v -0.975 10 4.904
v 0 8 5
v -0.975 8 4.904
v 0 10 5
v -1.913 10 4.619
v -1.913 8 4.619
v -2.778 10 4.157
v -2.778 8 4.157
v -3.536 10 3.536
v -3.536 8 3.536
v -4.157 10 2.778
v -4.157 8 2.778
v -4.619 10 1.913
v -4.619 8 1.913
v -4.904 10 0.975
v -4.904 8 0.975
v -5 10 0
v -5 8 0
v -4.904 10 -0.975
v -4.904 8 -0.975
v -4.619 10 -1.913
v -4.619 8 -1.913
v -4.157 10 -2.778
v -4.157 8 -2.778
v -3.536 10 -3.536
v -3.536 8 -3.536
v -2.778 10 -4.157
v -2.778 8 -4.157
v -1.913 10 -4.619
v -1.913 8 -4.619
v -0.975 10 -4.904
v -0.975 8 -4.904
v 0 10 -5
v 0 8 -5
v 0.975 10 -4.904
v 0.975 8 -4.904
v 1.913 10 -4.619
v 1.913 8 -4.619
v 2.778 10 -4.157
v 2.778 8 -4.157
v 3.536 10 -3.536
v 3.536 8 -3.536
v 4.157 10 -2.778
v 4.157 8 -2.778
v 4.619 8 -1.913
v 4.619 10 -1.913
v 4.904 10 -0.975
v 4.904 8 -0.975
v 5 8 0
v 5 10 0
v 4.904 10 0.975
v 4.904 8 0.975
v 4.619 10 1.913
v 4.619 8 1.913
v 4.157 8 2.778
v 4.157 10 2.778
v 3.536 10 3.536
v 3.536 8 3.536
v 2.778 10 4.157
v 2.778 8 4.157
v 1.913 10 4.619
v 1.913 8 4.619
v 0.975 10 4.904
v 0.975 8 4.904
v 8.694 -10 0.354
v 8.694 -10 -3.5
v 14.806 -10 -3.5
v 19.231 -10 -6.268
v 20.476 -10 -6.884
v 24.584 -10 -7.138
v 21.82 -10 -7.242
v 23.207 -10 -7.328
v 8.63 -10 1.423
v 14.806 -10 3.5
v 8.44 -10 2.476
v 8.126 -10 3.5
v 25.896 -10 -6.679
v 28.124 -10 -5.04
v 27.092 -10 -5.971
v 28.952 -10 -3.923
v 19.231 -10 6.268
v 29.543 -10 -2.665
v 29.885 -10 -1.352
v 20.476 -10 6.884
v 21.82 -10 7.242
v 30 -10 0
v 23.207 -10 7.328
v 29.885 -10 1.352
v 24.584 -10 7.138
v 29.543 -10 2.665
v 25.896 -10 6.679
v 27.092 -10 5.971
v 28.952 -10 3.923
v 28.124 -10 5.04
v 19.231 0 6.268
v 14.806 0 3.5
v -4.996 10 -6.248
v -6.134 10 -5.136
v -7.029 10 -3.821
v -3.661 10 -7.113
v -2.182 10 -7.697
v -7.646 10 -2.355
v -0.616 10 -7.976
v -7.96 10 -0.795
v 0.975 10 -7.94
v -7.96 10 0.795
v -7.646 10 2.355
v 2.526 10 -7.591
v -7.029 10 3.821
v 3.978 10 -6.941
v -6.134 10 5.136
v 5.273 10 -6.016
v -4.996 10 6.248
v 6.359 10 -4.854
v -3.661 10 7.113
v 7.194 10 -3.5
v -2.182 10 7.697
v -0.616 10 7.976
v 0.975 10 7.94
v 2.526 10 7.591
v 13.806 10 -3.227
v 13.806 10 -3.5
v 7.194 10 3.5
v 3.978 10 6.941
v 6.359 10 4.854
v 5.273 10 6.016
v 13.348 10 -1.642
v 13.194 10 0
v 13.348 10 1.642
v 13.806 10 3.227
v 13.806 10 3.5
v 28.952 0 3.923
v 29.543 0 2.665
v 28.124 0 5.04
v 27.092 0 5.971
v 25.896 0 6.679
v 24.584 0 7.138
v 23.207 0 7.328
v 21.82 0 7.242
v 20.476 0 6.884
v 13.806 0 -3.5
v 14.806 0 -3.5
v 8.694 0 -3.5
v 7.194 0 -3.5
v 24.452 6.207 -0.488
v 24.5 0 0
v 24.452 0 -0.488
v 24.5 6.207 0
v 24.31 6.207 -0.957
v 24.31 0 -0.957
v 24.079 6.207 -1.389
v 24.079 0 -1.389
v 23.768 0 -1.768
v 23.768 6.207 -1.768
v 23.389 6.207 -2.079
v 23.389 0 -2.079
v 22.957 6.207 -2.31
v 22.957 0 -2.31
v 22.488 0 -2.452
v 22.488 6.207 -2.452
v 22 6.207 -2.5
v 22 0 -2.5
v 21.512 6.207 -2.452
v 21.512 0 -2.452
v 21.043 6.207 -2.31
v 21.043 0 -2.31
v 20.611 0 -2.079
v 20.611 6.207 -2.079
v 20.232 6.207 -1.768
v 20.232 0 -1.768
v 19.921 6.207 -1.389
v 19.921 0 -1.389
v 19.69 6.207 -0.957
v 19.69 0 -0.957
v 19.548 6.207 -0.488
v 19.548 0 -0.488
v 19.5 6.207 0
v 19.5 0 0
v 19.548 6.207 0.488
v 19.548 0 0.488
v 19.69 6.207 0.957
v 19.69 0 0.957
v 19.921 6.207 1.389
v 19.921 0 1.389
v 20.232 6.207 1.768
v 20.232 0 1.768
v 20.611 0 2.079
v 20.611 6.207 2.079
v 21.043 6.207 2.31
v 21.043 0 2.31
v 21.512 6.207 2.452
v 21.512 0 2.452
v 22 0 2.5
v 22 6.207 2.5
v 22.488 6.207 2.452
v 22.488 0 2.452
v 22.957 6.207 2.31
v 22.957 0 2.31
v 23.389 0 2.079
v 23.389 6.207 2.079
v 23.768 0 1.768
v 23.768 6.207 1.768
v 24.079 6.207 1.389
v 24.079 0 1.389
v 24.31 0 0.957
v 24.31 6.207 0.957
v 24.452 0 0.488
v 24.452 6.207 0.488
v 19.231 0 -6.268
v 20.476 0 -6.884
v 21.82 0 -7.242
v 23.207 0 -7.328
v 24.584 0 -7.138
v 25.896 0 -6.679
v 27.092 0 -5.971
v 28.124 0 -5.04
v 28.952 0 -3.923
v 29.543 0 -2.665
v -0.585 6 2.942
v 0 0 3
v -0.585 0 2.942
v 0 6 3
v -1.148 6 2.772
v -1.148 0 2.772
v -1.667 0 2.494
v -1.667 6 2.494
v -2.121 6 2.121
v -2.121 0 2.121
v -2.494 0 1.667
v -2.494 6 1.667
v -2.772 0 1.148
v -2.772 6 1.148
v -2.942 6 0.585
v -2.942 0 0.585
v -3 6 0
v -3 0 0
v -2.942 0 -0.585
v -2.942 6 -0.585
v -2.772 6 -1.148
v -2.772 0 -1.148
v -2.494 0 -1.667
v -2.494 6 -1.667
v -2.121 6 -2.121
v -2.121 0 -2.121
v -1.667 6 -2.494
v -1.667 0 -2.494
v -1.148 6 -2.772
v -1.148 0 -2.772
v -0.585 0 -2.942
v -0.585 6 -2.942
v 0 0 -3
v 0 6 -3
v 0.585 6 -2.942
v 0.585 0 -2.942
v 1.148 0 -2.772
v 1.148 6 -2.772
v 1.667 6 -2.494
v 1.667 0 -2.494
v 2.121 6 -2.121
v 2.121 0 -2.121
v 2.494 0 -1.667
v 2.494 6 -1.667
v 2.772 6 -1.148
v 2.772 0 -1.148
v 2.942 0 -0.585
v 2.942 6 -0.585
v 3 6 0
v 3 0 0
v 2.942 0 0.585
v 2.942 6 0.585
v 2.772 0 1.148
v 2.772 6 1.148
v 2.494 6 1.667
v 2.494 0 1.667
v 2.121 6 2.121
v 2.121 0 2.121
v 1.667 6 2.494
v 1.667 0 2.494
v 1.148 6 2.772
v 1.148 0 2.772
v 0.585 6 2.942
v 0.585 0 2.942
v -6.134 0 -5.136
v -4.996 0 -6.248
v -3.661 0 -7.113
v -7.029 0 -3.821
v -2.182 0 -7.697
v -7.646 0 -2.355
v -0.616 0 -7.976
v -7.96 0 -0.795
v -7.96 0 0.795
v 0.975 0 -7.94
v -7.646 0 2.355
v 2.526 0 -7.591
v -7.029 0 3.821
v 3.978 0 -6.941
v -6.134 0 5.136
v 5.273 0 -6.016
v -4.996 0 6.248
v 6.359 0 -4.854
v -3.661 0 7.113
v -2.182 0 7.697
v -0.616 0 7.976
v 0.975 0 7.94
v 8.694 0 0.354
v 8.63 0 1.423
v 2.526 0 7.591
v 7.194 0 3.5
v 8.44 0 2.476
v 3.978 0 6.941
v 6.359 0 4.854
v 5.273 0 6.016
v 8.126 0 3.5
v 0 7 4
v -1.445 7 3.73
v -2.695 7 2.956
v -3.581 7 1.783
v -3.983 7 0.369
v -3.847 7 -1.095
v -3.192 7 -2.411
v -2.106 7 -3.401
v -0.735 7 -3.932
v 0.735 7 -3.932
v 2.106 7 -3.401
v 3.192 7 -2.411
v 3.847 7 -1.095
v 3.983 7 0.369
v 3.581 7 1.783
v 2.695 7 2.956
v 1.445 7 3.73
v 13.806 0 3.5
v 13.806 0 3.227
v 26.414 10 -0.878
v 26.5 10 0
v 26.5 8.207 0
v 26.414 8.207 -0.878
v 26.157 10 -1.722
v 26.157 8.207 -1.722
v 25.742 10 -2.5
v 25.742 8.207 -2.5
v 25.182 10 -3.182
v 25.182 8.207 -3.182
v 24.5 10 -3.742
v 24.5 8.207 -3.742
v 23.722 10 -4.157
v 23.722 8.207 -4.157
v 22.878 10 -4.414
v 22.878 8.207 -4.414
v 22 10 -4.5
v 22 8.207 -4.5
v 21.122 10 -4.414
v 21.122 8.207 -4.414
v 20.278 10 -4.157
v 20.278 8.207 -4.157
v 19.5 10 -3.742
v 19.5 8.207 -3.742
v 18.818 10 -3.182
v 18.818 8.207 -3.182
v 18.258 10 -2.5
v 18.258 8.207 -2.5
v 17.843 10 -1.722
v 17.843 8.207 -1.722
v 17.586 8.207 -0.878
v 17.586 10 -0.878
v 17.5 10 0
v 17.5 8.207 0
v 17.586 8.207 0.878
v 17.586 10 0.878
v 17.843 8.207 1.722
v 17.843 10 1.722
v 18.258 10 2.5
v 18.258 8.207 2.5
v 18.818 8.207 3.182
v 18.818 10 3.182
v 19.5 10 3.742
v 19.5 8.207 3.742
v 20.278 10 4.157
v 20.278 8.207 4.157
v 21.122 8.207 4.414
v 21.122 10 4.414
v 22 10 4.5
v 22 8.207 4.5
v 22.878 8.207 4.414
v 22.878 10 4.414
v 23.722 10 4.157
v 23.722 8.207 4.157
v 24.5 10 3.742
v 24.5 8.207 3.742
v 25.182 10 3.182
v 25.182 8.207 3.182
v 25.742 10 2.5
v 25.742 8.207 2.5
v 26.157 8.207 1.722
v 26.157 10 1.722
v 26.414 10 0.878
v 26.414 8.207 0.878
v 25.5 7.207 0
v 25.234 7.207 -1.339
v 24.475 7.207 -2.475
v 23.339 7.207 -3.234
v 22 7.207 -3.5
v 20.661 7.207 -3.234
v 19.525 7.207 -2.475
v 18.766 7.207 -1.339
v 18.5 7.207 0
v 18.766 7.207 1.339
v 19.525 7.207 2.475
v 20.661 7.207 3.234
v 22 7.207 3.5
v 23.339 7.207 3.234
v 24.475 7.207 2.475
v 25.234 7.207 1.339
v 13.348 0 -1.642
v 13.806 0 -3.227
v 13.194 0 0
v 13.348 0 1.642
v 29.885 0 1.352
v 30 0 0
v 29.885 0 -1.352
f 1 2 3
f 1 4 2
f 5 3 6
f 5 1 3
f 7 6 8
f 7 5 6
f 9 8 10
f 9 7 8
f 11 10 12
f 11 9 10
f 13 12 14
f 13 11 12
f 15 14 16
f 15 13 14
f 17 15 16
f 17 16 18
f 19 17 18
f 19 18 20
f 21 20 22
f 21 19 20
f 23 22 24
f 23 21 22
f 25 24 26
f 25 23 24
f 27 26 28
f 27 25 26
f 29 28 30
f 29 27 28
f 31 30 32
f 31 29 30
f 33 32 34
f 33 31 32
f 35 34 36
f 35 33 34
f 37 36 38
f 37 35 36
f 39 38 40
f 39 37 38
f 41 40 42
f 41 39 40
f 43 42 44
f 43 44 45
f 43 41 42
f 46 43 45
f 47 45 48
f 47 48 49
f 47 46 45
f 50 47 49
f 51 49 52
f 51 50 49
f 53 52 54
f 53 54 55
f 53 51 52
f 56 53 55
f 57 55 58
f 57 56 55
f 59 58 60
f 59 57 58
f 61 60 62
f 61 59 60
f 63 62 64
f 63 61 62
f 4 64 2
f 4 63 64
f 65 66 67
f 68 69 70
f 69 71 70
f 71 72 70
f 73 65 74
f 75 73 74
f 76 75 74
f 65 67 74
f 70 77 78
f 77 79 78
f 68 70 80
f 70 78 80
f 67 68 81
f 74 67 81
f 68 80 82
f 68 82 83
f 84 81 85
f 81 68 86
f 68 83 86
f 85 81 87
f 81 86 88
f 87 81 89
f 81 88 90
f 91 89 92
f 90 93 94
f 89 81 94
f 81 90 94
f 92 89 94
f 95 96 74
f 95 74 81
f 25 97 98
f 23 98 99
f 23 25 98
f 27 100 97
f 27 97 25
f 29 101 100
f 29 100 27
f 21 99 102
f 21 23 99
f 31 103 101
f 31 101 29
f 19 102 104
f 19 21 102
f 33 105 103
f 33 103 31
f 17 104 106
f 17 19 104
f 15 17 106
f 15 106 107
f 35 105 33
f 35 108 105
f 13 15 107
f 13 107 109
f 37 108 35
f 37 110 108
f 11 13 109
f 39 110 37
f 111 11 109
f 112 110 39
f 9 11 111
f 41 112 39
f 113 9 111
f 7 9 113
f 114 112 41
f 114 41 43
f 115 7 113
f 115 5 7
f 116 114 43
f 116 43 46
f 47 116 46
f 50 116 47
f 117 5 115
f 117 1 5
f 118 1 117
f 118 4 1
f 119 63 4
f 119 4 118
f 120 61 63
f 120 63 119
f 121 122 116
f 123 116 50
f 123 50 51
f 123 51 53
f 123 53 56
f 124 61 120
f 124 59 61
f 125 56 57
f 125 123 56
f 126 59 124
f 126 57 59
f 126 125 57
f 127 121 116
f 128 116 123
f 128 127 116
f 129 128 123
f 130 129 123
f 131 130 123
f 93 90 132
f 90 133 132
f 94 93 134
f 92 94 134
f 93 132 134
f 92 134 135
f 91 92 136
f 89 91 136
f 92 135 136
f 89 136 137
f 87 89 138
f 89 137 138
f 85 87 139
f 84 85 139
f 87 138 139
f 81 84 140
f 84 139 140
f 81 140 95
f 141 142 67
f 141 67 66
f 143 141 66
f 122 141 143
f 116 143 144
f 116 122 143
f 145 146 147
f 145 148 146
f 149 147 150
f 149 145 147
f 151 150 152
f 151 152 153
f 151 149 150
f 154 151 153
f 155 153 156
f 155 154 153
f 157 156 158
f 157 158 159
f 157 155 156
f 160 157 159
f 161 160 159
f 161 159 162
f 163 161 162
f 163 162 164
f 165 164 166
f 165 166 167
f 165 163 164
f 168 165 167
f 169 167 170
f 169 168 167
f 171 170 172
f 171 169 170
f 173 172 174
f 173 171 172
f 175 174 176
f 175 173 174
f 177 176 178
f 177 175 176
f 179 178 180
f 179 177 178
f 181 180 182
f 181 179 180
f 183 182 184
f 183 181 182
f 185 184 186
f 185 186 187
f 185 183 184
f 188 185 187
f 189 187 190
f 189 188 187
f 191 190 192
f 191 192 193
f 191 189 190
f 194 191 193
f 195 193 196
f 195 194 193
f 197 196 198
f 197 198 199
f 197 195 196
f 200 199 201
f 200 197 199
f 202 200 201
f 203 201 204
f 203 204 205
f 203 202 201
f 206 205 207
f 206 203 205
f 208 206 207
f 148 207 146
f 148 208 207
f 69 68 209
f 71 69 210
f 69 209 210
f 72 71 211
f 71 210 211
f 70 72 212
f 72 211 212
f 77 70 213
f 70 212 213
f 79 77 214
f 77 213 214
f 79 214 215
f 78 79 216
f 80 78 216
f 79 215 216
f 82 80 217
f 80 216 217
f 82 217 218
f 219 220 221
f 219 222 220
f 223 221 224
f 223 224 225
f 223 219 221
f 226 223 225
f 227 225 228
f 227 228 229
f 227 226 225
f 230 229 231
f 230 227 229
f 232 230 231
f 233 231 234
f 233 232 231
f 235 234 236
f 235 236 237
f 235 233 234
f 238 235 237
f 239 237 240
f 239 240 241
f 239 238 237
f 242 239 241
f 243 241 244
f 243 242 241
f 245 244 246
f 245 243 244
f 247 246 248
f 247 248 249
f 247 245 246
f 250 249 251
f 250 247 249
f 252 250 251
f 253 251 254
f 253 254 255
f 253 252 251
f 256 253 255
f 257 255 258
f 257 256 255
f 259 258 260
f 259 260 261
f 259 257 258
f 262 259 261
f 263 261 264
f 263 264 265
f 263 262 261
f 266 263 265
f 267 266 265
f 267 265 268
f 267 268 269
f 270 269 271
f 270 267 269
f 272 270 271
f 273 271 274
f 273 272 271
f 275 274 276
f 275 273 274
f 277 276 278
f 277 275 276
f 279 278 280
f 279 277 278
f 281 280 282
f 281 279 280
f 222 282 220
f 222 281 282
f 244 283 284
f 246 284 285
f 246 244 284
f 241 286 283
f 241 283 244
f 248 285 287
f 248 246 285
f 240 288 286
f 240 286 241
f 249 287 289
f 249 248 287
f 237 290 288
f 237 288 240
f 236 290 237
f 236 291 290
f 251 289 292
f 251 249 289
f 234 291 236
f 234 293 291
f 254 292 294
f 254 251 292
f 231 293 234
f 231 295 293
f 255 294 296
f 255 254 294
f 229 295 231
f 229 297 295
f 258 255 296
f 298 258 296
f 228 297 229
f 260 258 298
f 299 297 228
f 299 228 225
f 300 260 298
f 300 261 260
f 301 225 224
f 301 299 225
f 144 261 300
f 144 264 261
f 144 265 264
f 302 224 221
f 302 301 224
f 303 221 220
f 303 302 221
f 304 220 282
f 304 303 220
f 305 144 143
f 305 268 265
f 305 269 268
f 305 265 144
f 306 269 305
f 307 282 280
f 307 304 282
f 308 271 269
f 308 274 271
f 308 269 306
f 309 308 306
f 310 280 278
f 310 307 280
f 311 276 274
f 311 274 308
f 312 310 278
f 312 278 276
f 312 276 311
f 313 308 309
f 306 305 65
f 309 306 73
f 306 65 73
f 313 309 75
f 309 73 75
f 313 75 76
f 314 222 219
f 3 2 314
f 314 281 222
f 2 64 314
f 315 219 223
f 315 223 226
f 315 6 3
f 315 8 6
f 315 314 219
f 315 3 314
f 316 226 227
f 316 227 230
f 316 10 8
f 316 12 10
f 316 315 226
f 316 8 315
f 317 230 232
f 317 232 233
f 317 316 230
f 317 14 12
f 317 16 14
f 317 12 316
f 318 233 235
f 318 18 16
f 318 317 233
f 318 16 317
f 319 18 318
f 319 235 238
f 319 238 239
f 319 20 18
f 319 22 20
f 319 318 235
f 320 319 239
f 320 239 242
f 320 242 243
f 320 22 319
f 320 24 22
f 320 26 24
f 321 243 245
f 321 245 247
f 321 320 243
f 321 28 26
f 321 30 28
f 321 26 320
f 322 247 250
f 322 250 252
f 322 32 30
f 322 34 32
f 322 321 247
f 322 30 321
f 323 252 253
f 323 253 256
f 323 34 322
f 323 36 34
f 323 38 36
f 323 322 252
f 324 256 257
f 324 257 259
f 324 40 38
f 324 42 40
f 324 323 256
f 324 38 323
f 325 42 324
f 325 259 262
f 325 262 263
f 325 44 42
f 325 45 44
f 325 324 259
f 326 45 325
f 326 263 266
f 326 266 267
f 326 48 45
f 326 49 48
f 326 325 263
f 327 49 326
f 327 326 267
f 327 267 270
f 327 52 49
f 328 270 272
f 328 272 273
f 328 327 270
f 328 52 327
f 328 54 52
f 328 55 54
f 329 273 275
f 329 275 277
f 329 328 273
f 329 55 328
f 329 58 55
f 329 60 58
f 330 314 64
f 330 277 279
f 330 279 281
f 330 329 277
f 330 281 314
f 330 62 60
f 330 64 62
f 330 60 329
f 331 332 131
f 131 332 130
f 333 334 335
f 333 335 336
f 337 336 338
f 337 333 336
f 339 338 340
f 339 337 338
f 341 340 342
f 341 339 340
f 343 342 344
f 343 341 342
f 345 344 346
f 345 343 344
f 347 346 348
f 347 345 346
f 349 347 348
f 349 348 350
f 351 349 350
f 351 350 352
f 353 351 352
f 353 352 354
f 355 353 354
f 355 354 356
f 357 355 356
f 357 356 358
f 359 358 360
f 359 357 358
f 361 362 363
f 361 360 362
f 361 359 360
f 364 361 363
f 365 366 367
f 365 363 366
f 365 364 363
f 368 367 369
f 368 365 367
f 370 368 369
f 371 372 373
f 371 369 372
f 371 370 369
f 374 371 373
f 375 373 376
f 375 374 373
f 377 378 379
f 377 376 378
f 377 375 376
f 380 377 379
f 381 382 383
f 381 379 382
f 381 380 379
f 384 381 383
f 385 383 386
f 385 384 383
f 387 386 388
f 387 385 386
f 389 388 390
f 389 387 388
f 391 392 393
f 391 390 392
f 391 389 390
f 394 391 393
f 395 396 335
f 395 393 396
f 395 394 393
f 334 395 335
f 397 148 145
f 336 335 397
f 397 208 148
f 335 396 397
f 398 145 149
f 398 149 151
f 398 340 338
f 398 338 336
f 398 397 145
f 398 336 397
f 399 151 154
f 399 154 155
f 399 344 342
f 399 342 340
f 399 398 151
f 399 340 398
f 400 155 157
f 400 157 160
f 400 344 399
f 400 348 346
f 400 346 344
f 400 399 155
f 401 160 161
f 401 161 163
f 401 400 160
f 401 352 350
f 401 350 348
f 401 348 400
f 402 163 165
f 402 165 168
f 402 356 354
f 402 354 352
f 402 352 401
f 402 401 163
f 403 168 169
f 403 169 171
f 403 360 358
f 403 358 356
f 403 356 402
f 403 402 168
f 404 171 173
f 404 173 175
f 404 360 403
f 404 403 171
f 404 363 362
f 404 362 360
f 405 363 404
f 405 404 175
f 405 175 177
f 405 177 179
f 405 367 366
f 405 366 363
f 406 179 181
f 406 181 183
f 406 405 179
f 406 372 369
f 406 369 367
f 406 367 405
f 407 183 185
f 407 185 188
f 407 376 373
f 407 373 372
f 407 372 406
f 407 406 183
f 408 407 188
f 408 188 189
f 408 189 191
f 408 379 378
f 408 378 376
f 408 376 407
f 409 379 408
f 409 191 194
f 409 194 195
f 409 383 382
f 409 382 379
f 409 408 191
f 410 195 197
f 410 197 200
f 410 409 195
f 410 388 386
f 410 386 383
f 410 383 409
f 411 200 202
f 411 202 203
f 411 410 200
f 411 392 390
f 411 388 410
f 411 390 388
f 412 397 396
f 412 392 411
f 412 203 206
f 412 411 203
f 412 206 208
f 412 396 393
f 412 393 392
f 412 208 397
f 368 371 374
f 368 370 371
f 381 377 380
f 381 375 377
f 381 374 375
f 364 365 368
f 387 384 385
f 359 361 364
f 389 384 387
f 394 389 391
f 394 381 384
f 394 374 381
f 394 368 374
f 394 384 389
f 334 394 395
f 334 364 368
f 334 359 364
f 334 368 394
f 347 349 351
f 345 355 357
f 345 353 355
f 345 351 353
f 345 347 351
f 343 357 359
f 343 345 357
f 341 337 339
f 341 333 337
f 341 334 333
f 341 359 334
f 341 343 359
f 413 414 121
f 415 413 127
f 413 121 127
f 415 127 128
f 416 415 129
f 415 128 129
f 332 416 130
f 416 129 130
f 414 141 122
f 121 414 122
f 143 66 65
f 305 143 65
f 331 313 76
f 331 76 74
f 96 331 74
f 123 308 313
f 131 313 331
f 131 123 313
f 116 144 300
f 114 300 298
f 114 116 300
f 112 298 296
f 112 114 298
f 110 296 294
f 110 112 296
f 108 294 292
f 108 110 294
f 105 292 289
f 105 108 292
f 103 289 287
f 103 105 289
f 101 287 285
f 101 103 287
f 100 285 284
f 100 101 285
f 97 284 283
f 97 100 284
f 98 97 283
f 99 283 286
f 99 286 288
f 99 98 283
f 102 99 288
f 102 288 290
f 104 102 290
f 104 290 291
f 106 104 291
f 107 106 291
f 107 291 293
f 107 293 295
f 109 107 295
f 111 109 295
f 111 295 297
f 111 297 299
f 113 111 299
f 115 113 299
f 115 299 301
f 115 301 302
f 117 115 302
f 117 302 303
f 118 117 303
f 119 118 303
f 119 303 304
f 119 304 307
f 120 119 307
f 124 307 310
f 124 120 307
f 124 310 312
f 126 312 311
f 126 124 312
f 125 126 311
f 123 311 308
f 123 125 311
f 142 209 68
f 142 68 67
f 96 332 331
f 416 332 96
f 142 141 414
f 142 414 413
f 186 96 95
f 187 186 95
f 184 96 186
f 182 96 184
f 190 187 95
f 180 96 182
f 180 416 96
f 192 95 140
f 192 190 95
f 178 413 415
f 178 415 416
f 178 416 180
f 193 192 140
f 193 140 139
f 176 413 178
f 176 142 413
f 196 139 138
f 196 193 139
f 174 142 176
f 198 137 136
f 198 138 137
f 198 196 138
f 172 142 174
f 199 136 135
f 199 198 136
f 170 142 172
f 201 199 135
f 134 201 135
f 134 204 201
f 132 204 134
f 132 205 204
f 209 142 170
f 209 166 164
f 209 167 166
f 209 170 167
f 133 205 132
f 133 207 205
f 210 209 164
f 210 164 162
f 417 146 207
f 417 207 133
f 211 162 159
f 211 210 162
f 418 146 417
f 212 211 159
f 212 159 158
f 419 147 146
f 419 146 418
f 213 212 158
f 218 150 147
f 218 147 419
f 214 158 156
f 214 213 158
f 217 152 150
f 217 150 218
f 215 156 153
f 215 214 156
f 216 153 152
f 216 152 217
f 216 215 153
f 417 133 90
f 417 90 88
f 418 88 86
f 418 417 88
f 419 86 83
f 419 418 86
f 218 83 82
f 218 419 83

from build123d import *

# Parameters (mm, degrees)
SKETCH3_R               = 8
BOSS_EXTRUDE1_DEPTH     = 10
BOSS_EXTRUDE2_DEPTH     = 10
CUT_EXTRUDE1_DEPTH      = 34.648922717
CUT_EXTRUDE1_DEPTH_BACK = 34.648922717
SKETCH7_W               = 15.693747285
SKETCH7_H               = 10.5
SKETCH7_W_2             = 16.693747285
SKETCH13_R              = 8.806252715
SKETCH13_R_2            = 4.5
CUT_EXTRUDE2_DEPTH      = 10
FILLET1_R               = 7
CUT_EXTRUDE3_DEPTH      = 10


# Read off the part's stored shape, not the designer's step: Revolve1
with BuildPart() as part:
    # Sketch3 → Boss-Extrude1 (new, symmetric)
    with BuildSketch(Plane(origin=(0, 0, 0), x_dir=(1, 0, 0), z_dir=(0, 1, 0))):
        with Locations(Location((0, 0, 0), (0, 0, 270))):
            Circle(SKETCH3_R)
    extrude(amount=BOSS_EXTRUDE1_DEPTH, both=True)

    # Sketch6 → Boss-Extrude2 (add, symmetric)
    with BuildSketch(Plane(origin=(0, 0, 0), x_dir=(1, 0, 0), z_dir=(0, 1, 0))):
        with BuildLine():
            Line((7.193747285, -3.5), (14.806252715, -3.5))
            Line((14.806252715, -3.5), (22, -8))
            ThreePointArc((22, -8), (30, 0), (22, 8))
            Line((22, 8), (14.806252715, 3.5))
            Line((14.806252715, 3.5), (7.193747285, 3.5))
            ThreePointArc((7.193747285, 3.5), (8, 0), (7.193747285, -3.5))
        make_face()
    extrude(amount=BOSS_EXTRUDE2_DEPTH, both=True)

    # Sketch7 → Cut-Extrude1 (cut, two sides: drawn at the far end of the back side and taken through both)
    with BuildSketch(Plane.XY.offset(3.5).offset(-CUT_EXTRUDE1_DEPTH_BACK)):
        with Locations((-0.653126357, -5.25)):
            Rectangle(SKETCH7_W, SKETCH7_H)
        with Locations((22.153126358, 5.25)):
            Rectangle(SKETCH7_W_2, SKETCH7_H)
    extrude(amount=CUT_EXTRUDE1_DEPTH + CUT_EXTRUDE1_DEPTH_BACK, mode=Mode.SUBTRACT)

    # Sketch8 → Cut-Revolve2 (revolve, cut)
    with BuildSketch(Plane.XY, mode=Mode.PRIVATE) as cut_revolve2_sk:
        Polygon((0, 10), (0, 0), (3, 0), (3, 6), (5, 8), (5, 10), align=None)
    revolve(cut_revolve2_sk.sketch.rotate(Axis((0, 11.592954006, 0), (0, -1, 0)), 90), axis=Axis((0, 11.592954006, 0), (0, -1, 0)), mode=Mode.SUBTRACT)

    # Revolve1 outline → Revolve1 (revolve)
    with BuildSketch(Plane(origin=(22, 0, 0), x_dir=(1, 0, 0), z_dir=(0, 0, 1))):
        Polygon((0, 10), (0, 0), (2.5, 0), (2.5, 6.207106781), (4.5, 8.207106781), (4.5, 10), align=None)
    revolve(axis=Axis((22, 0, 0), (0, 1, 0)))

    # Sketch13 → Cut-Extrude2 (cut)
    with BuildSketch(Plane(origin=(0, 10, 0), x_dir=(1, 0, 0), z_dir=(0, 1, 0))):
        with Locations((22, 0)):
            Circle(SKETCH13_R)
        with Locations(Location((22, 0, 0), (0, 0, 270))):
            Circle(SKETCH13_R_2, mode=Mode.SUBTRACT)
    extrude(amount=-CUT_EXTRUDE2_DEPTH, mode=Mode.SUBTRACT)

    # Fillet1
    fillet1_edges = [part.edges().sort_by_distance(p)[0] for p in [
        (22, -5, -8),
        (22, -5, 8),
    ]]
    fillet(fillet1_edges, radius=FILLET1_R)

    # Sketch14 → Cut-Extrude3 (cut)
    with BuildSketch(Plane.XZ.offset(10)):
        with BuildLine():
            Line((8.693747285, -3.5), (8.693747285, 0.353821083))
            ThreePointArc((8.693747285, 0.353821083), (6.057708316, 6.717782114), (-0.306252715, 9.353821083))
            Line((-0.306252715, 9.353821083), (-1.238376204, 9.353821083))
            ThreePointArc((-1.238376204, 9.353821083), (-36.061646902, -27.818232152), (8.693747285, -3.5))
        make_face()
    extrude(amount=-CUT_EXTRUDE3_DEPTH, mode=Mode.SUBTRACT)


solid = part.part
